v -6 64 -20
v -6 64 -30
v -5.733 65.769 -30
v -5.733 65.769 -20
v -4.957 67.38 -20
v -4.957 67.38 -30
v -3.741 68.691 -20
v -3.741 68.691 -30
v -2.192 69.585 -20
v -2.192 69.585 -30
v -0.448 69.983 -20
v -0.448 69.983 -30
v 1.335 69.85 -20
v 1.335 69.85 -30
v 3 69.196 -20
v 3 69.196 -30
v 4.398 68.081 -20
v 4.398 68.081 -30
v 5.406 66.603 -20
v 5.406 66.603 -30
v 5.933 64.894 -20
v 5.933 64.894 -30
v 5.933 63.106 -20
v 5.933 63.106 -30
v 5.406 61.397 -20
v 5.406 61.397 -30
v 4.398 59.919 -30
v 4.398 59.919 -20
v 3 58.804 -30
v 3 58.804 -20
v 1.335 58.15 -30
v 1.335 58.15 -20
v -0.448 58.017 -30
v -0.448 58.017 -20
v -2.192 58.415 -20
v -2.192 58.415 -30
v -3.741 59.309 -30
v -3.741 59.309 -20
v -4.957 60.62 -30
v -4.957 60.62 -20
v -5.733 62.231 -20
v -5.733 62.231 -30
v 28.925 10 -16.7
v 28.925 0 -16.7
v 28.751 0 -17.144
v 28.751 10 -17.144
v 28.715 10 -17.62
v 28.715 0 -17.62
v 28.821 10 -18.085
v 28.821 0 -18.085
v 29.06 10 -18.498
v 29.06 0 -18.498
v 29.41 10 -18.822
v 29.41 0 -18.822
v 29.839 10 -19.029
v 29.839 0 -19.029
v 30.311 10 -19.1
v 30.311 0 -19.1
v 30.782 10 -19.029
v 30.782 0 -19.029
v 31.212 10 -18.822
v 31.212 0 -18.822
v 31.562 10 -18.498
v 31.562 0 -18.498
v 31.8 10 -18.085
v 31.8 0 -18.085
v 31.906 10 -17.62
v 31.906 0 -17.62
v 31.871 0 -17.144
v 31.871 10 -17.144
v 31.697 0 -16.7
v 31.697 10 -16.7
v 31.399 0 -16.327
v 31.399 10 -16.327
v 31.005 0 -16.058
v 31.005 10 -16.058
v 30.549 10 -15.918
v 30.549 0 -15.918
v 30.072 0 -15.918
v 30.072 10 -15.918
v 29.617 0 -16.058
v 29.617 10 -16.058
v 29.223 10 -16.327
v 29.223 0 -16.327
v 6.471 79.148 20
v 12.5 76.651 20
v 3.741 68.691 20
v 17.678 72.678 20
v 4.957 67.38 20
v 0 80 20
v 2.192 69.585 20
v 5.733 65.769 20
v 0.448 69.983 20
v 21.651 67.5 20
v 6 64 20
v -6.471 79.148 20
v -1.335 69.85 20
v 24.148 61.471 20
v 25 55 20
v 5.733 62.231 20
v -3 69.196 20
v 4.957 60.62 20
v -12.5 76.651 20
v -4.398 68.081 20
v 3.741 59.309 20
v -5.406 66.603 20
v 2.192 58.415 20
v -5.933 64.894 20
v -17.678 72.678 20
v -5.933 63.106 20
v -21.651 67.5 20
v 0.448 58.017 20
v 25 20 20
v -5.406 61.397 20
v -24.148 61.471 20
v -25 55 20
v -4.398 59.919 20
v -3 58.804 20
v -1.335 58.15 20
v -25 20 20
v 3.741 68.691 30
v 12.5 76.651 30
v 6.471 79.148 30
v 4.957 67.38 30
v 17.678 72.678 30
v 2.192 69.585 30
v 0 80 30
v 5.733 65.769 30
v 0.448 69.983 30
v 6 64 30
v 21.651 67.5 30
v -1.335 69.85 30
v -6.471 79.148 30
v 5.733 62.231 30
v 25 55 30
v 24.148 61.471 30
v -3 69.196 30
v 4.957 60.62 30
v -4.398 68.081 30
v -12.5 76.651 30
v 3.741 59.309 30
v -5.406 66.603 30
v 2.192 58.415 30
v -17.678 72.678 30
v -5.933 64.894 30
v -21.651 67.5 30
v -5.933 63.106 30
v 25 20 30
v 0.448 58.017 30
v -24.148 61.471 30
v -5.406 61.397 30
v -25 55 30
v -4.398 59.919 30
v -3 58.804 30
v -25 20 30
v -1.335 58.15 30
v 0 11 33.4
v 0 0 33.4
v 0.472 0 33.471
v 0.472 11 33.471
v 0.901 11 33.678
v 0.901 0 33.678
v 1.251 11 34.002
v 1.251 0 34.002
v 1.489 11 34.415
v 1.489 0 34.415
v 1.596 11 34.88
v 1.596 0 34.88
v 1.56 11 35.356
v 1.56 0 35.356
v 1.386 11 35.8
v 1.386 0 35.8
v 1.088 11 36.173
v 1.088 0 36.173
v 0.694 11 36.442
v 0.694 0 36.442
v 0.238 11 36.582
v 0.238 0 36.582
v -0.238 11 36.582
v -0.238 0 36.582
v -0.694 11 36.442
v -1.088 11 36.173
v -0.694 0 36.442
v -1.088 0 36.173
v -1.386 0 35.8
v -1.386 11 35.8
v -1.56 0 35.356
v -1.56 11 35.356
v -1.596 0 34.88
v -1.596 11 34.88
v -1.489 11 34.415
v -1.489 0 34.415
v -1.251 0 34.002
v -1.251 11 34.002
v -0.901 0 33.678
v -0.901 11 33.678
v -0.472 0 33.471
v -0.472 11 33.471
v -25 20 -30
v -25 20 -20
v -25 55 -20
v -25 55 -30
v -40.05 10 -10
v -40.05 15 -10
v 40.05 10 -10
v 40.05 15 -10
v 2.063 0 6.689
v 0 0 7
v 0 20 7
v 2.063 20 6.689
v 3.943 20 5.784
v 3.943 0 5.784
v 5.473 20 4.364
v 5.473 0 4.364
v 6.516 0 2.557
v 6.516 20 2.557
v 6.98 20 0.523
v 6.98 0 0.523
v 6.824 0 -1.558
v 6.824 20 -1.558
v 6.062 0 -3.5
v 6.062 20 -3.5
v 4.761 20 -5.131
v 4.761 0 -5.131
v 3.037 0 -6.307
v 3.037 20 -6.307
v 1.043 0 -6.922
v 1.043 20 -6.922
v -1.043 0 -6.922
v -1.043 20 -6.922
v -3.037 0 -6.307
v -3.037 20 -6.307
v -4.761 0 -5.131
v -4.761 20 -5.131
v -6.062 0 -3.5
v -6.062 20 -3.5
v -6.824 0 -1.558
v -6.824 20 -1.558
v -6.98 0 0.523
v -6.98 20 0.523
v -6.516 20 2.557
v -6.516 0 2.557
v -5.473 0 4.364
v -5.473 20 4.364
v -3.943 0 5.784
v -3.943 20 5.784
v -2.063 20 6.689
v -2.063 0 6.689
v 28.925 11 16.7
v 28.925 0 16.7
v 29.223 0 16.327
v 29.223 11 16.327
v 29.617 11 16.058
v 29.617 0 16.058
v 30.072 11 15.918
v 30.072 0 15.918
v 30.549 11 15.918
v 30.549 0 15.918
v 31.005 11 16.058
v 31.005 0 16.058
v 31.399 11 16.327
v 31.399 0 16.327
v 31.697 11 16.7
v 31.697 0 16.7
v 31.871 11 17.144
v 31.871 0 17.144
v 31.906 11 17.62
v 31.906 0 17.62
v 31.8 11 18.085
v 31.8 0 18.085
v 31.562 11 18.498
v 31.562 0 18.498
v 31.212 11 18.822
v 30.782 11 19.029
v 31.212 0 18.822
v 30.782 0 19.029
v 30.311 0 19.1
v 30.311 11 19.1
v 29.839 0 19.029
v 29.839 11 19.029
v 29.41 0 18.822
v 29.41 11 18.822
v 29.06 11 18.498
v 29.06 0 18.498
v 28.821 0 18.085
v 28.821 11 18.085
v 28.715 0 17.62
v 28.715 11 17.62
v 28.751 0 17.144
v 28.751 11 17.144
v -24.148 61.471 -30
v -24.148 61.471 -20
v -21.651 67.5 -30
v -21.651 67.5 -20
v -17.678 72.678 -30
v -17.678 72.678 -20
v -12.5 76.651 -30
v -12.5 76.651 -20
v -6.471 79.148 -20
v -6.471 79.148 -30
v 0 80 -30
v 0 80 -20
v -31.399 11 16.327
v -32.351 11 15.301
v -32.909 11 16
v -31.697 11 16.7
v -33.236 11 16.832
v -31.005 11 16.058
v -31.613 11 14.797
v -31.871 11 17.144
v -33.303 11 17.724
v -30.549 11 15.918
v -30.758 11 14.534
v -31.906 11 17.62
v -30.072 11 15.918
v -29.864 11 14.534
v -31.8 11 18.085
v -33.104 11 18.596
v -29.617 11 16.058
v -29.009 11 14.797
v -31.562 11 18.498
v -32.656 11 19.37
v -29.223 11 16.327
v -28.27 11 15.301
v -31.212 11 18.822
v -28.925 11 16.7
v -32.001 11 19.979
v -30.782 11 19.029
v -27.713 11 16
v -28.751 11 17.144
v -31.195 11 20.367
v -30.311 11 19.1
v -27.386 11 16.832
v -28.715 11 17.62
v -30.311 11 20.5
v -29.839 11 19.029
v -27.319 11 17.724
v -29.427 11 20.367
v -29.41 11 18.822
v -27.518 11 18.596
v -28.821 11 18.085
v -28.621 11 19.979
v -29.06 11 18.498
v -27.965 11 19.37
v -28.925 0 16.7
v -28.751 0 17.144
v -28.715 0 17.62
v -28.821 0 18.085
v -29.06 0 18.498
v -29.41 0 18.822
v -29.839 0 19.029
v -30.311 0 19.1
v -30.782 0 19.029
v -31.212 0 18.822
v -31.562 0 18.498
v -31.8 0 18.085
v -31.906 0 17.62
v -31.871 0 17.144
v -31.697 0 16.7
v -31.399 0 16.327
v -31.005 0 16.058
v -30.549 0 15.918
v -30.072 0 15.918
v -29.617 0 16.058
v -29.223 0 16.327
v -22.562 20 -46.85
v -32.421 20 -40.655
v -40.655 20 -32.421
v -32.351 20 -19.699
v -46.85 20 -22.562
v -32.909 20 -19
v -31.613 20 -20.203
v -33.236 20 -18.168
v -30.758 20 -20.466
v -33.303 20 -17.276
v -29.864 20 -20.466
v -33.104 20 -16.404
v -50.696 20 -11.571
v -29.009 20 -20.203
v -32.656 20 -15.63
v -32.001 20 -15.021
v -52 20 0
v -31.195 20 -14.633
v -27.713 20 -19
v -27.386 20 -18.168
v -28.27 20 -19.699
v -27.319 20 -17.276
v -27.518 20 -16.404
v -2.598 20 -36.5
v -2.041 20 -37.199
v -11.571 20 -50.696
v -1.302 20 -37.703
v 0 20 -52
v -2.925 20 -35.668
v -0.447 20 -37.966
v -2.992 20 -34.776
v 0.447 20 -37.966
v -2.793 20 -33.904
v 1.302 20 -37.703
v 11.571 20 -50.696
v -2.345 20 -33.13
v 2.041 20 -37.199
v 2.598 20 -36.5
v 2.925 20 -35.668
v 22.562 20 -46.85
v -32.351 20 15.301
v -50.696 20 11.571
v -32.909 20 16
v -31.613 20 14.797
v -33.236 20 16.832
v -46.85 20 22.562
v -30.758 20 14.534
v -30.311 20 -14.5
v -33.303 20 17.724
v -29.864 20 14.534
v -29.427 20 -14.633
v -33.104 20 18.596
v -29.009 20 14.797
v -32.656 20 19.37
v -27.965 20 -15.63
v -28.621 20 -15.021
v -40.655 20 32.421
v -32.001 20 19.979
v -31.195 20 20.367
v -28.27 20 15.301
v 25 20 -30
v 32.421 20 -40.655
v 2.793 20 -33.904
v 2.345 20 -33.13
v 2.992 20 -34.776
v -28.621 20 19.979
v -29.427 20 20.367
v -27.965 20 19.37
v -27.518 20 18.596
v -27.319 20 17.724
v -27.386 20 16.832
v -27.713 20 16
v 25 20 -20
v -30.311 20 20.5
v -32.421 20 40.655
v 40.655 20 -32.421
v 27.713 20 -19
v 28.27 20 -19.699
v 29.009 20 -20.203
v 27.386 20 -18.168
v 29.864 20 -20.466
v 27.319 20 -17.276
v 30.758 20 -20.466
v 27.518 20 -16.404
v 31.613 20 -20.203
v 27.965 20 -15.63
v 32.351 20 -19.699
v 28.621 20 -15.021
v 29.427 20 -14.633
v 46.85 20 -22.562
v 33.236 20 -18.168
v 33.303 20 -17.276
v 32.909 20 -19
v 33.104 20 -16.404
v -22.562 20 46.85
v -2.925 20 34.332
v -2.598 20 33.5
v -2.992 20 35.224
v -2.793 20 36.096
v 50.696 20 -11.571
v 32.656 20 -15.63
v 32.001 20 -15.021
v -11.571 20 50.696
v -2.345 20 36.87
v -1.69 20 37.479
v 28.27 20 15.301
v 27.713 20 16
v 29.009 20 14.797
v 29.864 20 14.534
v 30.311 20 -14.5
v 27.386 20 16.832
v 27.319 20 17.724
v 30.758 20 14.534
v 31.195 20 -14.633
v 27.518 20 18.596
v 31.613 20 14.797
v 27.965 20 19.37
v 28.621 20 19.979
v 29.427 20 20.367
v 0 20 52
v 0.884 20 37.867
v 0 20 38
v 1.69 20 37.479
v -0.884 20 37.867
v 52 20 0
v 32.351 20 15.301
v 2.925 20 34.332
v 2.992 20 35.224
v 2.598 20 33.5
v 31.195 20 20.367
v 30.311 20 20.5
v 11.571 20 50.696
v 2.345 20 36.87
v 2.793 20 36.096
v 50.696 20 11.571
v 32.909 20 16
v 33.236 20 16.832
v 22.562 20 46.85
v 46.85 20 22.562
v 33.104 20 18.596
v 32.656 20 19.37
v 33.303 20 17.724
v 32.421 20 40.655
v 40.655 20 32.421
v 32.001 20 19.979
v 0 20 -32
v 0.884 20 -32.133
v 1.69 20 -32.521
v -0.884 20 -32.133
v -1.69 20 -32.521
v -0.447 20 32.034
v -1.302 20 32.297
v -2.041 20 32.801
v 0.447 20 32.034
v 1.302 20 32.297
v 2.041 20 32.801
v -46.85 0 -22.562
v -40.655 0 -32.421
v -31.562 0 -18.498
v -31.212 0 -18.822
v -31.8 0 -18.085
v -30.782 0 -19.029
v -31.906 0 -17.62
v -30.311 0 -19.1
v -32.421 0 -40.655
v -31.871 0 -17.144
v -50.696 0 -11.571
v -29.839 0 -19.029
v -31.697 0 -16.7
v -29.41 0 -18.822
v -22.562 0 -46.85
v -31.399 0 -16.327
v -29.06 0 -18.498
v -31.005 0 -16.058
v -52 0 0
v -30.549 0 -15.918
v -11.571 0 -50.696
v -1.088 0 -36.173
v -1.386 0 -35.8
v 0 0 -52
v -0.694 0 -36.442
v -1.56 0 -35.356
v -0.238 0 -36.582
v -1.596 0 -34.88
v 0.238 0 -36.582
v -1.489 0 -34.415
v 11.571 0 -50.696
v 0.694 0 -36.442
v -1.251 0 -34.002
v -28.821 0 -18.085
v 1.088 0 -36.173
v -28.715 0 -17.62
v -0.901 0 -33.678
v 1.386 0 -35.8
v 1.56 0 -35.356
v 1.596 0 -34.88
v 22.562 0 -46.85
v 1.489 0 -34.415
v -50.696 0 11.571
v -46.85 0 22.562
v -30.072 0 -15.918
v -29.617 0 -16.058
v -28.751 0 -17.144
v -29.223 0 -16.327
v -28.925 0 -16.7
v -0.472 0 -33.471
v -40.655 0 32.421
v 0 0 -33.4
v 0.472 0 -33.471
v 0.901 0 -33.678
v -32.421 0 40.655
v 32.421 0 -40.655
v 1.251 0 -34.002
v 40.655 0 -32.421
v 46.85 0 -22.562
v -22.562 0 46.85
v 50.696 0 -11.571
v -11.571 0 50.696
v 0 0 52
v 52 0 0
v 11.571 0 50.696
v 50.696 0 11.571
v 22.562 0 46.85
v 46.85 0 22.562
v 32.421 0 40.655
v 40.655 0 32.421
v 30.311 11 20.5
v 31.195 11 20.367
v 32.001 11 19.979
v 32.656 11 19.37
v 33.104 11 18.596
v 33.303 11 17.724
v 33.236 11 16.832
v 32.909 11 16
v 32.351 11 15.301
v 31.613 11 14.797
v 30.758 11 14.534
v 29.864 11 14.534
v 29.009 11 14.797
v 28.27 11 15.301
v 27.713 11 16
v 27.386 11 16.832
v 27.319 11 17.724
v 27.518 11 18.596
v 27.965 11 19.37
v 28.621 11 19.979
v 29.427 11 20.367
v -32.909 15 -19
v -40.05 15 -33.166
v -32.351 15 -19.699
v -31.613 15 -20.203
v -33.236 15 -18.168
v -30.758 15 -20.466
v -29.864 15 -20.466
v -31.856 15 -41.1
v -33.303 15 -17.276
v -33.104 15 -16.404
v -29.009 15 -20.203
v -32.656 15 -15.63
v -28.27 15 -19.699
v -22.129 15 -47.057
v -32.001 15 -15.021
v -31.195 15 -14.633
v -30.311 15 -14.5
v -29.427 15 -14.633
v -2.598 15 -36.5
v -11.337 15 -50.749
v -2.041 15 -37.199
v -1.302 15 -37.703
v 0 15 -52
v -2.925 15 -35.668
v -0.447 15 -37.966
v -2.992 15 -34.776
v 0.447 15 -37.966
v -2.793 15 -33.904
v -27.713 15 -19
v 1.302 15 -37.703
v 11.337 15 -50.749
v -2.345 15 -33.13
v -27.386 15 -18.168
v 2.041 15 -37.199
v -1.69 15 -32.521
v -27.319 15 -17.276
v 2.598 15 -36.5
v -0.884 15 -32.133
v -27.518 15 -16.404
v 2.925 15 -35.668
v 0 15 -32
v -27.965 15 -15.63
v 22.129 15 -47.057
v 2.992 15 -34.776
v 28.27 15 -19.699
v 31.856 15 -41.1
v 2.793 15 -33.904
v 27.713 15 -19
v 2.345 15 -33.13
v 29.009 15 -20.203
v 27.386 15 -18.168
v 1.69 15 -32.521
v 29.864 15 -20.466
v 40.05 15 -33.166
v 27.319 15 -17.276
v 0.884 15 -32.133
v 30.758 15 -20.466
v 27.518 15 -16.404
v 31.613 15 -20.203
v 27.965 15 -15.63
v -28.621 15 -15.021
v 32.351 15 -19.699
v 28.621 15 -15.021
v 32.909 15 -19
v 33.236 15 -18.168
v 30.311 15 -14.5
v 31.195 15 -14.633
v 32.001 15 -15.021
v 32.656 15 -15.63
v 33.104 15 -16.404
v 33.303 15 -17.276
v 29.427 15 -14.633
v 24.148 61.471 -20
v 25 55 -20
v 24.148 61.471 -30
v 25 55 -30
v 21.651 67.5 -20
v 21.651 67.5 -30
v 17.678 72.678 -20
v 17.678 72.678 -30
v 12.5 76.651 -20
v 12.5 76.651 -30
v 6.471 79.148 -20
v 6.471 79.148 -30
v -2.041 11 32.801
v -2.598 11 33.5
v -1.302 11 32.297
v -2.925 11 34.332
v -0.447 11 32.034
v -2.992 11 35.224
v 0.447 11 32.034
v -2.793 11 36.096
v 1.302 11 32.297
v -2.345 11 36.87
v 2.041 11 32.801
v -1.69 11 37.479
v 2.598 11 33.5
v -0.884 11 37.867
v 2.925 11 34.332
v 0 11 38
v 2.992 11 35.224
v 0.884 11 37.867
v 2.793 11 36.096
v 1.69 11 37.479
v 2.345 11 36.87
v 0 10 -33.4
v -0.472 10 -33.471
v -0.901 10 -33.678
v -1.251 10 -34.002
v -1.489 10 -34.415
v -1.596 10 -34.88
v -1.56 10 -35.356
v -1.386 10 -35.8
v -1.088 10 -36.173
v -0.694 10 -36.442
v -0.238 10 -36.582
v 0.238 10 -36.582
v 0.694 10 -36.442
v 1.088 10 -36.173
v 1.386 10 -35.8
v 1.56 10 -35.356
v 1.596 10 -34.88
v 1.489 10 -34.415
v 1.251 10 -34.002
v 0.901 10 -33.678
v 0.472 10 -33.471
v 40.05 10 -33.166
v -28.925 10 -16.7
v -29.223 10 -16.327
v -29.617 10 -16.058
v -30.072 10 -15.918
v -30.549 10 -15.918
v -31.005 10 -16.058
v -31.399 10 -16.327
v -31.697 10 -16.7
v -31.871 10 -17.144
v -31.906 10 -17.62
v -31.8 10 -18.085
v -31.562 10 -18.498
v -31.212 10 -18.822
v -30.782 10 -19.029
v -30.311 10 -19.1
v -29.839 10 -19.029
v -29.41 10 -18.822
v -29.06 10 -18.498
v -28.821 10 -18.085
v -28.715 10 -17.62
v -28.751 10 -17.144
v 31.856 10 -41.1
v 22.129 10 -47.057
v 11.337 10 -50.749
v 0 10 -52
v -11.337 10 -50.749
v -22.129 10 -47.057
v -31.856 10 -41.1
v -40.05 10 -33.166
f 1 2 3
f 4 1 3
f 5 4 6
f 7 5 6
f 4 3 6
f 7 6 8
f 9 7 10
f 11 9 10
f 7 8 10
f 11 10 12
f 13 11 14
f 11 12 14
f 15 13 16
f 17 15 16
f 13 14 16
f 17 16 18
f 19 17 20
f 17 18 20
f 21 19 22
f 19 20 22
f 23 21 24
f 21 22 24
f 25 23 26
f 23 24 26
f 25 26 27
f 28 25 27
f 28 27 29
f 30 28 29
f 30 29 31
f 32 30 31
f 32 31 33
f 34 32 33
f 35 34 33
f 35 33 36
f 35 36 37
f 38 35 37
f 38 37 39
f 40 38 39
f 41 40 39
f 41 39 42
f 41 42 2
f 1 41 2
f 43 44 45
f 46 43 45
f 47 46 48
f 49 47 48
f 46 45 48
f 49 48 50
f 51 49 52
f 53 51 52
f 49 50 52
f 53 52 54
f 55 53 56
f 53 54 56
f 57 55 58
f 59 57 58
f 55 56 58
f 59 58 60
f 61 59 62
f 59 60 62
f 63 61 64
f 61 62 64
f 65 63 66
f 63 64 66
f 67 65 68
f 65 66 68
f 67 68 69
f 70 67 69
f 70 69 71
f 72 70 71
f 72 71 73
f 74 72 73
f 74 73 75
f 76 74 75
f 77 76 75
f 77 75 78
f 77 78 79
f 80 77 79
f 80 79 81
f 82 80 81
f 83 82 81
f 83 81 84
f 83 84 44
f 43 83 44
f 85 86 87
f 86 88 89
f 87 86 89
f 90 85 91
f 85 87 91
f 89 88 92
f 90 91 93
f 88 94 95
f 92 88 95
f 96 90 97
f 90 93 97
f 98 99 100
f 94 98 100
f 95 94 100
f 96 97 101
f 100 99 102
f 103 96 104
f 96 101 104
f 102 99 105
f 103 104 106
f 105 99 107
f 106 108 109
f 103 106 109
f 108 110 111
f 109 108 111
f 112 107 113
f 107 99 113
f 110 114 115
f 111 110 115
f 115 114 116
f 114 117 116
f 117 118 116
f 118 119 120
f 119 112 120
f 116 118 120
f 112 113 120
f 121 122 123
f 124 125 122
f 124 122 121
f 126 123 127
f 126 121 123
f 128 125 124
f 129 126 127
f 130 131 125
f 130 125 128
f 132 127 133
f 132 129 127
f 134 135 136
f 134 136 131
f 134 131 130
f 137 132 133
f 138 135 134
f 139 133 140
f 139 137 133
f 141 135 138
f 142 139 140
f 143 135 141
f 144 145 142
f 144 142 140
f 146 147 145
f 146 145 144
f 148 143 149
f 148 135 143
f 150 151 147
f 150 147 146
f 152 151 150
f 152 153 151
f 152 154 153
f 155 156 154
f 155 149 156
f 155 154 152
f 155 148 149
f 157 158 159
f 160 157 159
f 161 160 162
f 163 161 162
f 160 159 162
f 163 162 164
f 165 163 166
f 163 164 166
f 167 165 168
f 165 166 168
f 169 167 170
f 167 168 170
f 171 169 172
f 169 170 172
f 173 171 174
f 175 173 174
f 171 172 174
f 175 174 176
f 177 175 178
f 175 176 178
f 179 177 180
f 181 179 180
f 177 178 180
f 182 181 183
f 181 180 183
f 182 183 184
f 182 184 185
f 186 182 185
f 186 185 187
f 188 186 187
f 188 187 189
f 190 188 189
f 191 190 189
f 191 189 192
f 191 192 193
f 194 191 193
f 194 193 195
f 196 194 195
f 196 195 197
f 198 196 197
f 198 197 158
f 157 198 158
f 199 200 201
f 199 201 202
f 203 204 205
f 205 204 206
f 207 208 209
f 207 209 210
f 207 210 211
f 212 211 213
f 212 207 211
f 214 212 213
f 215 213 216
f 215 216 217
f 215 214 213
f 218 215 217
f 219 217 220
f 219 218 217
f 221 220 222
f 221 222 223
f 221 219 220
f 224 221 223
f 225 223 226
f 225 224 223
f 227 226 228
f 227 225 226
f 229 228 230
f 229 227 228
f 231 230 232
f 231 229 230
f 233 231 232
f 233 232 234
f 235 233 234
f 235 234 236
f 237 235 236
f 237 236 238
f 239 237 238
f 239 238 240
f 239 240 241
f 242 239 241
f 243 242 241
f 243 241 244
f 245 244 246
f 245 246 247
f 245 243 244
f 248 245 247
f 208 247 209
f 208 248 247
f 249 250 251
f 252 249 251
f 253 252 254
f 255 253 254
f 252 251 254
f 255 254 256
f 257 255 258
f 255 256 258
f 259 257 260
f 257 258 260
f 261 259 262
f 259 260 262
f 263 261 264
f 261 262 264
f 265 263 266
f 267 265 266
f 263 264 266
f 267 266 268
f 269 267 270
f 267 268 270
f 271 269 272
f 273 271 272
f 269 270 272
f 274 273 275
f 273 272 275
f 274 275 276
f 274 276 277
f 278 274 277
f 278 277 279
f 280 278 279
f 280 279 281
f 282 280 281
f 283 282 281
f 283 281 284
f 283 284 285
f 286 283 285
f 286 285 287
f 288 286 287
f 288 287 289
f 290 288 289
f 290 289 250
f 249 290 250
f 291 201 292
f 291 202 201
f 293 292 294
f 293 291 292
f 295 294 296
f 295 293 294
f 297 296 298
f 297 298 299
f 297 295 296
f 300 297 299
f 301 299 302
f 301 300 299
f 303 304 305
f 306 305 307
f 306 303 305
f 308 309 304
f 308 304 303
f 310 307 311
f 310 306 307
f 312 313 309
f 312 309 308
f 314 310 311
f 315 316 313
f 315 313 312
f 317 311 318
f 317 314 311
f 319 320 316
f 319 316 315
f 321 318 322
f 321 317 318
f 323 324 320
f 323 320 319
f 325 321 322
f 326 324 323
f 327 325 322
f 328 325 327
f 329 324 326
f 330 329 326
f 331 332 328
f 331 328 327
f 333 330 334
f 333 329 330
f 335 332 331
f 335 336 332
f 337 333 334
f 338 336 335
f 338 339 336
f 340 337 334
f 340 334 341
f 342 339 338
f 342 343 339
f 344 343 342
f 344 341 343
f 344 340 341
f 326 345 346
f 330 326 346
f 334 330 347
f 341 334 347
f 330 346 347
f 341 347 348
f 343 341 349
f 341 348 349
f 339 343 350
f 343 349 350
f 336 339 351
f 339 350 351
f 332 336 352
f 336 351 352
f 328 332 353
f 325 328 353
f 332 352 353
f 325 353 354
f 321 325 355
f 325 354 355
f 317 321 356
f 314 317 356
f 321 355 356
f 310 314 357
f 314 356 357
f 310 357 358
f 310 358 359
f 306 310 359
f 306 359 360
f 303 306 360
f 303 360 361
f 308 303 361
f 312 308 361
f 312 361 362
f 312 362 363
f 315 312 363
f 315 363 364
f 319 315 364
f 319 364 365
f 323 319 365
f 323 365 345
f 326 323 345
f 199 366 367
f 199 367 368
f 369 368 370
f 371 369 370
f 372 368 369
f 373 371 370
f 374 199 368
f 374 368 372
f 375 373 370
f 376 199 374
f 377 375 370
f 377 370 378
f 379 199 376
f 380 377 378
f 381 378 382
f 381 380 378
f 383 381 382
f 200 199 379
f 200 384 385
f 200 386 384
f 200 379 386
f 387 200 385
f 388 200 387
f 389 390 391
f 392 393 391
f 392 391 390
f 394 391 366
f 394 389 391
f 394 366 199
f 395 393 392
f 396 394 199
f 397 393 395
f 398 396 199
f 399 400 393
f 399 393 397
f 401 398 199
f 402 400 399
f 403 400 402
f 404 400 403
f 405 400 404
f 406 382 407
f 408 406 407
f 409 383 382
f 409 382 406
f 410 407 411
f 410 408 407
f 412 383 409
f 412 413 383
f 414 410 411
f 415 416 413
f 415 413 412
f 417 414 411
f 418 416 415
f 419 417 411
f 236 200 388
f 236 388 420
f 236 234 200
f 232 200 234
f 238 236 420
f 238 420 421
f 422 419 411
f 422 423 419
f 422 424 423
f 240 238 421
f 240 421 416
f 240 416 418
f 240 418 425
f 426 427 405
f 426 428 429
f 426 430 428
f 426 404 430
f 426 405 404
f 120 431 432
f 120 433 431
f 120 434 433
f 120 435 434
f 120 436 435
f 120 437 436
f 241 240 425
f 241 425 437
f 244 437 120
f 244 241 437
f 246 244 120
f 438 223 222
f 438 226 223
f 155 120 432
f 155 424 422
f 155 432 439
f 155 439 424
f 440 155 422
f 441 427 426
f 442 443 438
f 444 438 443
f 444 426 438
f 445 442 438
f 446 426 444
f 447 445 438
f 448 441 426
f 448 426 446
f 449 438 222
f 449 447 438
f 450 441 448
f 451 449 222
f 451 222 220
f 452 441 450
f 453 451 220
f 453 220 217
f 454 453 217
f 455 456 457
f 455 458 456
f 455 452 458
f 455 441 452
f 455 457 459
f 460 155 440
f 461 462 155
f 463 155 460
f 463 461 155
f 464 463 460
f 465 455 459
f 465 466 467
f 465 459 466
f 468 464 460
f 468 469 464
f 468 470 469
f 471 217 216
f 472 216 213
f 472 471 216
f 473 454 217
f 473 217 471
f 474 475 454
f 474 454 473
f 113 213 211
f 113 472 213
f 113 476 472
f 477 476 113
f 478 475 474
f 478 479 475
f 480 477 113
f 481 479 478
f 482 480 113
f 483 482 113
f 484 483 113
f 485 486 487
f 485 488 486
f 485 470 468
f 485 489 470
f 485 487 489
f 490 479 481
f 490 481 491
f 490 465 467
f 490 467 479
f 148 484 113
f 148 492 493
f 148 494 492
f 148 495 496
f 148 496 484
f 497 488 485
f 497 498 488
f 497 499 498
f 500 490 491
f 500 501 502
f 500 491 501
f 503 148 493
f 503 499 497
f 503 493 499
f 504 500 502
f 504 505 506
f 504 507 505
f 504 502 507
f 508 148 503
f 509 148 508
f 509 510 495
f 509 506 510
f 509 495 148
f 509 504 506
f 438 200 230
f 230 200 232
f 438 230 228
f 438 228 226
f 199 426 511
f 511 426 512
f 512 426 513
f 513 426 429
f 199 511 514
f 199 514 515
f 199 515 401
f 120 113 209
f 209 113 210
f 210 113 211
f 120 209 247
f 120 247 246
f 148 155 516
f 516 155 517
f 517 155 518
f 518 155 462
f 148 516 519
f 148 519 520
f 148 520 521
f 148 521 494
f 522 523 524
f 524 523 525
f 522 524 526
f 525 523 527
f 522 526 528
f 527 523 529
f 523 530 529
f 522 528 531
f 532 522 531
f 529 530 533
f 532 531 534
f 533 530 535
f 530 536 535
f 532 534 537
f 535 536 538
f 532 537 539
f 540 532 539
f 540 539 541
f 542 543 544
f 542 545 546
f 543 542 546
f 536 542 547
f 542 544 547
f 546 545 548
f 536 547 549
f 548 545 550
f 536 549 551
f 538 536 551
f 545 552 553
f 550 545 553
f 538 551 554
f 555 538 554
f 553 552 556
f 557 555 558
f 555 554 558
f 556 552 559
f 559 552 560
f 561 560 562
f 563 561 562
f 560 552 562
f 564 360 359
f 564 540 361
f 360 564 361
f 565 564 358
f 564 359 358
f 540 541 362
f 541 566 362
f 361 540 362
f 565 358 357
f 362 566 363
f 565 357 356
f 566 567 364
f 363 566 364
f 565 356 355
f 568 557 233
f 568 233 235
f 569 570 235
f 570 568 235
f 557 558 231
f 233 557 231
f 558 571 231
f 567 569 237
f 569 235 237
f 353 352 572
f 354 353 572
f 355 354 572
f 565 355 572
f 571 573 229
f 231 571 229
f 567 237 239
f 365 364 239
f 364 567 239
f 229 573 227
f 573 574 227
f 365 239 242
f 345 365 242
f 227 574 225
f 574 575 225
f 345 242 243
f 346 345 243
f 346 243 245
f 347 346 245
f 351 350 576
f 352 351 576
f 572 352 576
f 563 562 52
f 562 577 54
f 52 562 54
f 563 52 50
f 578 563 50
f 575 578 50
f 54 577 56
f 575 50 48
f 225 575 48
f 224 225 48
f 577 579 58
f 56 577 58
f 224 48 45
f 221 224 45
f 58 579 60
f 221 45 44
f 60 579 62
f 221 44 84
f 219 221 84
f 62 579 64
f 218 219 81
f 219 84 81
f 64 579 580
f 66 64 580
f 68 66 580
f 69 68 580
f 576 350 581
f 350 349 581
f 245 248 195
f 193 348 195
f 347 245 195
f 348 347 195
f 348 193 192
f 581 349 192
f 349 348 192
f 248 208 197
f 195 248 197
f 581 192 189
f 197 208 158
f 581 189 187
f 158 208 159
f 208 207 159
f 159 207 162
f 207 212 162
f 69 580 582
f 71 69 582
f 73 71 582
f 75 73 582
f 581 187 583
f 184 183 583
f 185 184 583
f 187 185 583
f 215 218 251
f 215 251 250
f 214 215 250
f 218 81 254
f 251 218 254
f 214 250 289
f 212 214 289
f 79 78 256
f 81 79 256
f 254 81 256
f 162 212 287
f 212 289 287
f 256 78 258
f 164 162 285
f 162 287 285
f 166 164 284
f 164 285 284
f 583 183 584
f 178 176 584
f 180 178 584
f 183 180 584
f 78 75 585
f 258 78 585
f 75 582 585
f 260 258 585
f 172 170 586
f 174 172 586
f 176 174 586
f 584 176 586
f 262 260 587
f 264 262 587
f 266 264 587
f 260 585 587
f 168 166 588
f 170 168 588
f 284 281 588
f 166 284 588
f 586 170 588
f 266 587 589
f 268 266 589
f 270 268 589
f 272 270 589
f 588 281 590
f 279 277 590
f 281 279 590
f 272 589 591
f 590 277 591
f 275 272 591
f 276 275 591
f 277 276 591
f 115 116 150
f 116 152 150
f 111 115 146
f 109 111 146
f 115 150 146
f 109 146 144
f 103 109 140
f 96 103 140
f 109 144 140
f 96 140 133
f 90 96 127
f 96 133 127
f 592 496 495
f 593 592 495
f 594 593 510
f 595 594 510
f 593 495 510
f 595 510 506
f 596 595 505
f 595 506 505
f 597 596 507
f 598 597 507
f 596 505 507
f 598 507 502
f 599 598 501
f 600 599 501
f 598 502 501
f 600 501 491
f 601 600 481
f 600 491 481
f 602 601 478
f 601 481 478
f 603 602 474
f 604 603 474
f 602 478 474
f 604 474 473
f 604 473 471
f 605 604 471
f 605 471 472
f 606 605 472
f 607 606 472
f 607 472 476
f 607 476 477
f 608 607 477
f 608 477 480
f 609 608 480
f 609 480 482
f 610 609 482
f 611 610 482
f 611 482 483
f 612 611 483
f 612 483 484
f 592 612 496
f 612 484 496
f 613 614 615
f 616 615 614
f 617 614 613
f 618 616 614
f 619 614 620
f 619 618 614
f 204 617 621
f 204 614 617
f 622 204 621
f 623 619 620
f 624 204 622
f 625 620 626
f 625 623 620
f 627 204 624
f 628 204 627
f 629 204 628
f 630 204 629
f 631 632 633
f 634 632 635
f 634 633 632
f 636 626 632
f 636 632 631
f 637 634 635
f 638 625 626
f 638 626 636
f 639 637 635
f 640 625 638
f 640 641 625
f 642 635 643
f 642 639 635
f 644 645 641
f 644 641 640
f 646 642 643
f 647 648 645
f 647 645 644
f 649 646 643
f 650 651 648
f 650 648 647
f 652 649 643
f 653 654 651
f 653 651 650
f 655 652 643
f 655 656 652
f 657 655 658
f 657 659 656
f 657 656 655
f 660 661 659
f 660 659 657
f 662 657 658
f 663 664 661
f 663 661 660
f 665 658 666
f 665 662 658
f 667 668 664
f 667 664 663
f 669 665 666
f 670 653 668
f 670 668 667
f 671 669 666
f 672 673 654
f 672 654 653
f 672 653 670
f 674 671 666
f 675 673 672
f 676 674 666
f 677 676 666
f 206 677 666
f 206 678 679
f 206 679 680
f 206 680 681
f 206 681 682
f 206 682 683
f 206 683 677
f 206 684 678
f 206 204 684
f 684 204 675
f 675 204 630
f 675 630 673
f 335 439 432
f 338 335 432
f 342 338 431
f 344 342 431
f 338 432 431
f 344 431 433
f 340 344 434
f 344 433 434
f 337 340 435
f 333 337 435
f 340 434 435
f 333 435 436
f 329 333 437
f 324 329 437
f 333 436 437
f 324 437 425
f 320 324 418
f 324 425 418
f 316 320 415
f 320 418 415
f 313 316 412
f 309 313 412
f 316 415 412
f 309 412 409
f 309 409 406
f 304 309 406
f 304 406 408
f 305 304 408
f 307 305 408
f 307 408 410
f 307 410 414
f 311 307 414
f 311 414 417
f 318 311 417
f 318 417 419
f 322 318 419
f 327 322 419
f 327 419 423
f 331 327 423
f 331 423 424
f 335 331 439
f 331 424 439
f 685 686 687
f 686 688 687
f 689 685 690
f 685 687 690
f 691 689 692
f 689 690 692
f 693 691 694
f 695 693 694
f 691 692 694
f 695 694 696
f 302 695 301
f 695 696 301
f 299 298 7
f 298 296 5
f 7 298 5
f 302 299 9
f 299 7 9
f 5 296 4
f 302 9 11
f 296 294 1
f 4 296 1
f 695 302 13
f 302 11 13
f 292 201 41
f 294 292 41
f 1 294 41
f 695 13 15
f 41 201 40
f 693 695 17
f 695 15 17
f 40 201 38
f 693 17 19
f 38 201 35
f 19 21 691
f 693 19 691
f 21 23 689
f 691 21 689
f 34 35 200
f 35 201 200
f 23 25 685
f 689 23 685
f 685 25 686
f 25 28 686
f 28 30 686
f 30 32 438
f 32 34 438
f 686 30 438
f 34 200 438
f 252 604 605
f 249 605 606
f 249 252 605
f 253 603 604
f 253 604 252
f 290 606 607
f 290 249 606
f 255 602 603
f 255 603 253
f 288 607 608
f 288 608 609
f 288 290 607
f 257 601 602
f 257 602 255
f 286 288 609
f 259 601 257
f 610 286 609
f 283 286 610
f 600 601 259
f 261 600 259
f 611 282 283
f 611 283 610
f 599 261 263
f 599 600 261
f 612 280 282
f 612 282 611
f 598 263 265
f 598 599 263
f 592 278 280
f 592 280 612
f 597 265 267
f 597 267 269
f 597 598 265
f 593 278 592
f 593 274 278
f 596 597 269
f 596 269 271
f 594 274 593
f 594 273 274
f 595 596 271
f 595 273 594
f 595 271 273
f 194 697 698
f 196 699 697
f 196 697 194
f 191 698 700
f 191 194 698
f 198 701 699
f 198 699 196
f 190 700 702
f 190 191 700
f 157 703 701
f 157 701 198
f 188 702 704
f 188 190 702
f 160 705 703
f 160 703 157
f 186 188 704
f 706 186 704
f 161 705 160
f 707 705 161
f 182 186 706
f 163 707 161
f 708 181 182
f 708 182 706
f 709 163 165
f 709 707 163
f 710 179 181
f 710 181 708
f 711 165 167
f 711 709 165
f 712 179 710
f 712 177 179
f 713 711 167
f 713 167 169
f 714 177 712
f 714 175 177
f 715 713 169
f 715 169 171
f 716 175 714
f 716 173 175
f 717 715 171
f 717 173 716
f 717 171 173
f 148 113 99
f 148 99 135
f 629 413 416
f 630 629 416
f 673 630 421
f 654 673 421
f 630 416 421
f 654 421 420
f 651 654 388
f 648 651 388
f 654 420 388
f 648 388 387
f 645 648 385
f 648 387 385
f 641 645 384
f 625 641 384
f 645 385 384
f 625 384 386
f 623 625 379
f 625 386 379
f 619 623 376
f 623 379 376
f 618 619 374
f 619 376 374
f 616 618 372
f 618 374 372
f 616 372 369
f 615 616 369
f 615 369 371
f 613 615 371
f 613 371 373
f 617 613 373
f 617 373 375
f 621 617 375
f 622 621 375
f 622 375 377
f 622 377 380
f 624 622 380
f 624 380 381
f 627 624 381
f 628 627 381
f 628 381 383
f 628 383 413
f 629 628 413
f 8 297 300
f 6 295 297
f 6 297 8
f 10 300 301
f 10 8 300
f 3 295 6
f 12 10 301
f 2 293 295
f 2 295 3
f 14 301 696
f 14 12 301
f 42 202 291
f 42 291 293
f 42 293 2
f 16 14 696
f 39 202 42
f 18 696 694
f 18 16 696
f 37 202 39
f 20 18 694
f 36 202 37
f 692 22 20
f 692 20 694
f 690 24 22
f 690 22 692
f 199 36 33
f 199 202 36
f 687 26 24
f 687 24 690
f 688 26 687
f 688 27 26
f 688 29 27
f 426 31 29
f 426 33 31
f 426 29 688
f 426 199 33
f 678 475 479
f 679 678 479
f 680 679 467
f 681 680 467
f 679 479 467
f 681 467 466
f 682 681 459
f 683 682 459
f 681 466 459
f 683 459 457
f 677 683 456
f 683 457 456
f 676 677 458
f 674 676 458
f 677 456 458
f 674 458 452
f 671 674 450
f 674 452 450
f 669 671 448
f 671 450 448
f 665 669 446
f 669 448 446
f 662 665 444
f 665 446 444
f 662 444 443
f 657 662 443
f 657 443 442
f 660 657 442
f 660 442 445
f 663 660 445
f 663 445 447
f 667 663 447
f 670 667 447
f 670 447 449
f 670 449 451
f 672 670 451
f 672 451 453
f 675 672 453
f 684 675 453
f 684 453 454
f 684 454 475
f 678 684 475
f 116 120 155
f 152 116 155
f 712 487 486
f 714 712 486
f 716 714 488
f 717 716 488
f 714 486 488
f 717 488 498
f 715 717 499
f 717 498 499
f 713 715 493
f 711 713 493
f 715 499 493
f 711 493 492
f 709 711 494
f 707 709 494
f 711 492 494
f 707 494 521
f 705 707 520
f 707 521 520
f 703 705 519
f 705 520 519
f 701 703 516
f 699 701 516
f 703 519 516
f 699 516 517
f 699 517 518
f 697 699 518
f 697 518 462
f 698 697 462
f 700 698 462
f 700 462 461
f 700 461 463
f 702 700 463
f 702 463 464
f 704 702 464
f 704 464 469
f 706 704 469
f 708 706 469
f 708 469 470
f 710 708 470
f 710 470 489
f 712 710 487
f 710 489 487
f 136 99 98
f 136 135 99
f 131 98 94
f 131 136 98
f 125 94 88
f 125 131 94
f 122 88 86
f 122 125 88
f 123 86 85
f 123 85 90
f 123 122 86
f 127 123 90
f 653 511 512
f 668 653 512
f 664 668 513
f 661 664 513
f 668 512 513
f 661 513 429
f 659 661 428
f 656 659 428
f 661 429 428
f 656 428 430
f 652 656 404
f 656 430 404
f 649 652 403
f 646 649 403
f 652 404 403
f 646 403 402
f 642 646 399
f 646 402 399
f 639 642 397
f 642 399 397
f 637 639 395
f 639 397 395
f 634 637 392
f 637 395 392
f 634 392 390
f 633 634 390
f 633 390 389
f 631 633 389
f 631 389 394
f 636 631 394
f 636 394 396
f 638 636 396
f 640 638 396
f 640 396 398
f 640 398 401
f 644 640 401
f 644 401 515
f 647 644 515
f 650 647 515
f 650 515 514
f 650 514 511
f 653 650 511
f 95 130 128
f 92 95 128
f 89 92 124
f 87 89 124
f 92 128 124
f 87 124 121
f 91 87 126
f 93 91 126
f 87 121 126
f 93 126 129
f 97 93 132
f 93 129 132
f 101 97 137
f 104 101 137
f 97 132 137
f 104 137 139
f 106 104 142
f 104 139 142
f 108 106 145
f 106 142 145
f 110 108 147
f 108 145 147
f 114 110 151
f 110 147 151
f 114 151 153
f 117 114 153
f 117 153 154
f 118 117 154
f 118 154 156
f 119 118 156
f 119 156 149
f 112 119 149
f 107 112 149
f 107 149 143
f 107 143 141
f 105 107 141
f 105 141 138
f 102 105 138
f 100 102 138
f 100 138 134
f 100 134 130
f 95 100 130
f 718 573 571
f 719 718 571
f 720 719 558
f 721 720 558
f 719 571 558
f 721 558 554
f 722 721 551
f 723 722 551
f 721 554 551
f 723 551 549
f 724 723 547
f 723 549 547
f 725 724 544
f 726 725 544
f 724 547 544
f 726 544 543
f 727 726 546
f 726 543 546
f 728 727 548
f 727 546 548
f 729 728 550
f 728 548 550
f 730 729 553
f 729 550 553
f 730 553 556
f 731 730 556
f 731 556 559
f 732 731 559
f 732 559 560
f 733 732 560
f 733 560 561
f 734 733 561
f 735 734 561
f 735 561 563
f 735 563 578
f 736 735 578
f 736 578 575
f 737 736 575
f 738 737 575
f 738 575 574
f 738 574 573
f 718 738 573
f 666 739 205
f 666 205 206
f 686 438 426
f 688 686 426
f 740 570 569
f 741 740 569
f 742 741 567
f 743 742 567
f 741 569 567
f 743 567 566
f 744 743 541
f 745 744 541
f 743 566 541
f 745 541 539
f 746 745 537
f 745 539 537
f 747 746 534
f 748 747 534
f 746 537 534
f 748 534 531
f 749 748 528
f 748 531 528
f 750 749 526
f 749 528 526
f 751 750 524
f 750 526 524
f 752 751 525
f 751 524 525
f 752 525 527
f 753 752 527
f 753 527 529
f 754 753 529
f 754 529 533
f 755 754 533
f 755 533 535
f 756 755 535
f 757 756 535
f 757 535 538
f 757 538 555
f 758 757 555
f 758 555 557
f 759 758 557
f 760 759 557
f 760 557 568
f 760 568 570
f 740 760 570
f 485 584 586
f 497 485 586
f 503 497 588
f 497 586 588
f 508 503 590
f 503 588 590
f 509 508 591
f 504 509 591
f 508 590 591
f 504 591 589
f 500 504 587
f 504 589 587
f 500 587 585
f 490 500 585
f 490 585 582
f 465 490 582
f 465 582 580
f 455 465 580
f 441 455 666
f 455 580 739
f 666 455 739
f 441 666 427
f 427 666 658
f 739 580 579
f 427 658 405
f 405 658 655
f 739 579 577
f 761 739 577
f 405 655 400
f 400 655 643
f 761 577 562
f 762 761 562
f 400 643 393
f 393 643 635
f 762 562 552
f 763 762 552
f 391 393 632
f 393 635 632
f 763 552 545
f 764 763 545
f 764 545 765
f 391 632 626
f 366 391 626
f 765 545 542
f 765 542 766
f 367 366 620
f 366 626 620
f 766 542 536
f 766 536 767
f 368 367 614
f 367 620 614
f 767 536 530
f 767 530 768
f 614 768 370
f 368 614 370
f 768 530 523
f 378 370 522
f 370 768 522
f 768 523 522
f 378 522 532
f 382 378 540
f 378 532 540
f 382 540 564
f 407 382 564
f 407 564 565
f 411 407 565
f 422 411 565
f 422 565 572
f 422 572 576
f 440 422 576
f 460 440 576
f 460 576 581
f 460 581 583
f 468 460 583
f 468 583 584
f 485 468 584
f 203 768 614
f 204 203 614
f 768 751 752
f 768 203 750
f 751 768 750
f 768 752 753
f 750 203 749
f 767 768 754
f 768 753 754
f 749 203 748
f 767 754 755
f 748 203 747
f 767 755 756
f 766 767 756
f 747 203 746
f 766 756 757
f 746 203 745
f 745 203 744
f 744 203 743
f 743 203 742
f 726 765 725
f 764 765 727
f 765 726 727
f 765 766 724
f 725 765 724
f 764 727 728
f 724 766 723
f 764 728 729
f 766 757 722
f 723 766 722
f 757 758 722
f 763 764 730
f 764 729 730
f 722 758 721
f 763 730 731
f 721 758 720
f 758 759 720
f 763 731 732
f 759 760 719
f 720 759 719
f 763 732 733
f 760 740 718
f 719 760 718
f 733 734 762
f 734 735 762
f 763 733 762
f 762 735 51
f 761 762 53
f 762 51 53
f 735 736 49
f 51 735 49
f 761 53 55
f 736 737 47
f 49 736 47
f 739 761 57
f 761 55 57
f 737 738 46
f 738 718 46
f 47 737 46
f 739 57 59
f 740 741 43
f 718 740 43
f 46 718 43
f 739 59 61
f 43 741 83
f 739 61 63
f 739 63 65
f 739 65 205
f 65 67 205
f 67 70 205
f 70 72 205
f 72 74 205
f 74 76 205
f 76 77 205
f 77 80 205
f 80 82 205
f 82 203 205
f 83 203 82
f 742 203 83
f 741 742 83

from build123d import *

# Parameters (mm, degrees)
ESQUISSE1_R                        = 52
ESQUISSE1_R_2                      = 7
BOSS_EXTRU_1_DEPTH                 = 20
ESQUISSE2_W                        = 50
ESQUISSE2_H                        = 10
BOSS_EXTRU_2_DEPTH                 = 60
CONG_1_R                           = 25
ESQUISSE3_R                        = 6
ENL_V_MAT_EXTRU_1_DEPTH            = 40
R_P_TITION_CIRCULAIRE1_COUNT       = 2
CONG_1_OF_R_P_TITION_CIRCULAIRE1_R = 25
ESQUISSE5_R                        = 1.6
ENL_V_MAT_EXTRU_2_DEPTH            = 20
R_P_TITION_CIRCULAIRE2_COUNT       = 6
ESQUISSE6_R                        = 3
ENL_V_MAT_EXTRU_3_DEPTH            = 9
ENL_V_START                        = -10
ESQUISSE7_W                        = 80.1
ESQUISSE7_H                        = 5
ENL_V_MAT_EXTRU_4_DEPTH            = 45


with BuildPart() as part:
    # Esquisse1 → Boss.-Extru.1 (new body)
    with BuildSketch(Plane(origin=(0, 0, 0), x_dir=(1, 0, 0), z_dir=(0, 1, 0))):
        with Locations(Location((0, 0, 0), (0, 0, 270))):
            Circle(ESQUISSE1_R)
        with Locations(Location((0, 0, 0), (0, 0, 270))):
            Circle(ESQUISSE1_R_2, mode=Mode.SUBTRACT)
    extrude(amount=BOSS_EXTRU_1_DEPTH)

    # Esquisse2 → Boss.-Extru.2 (add)
    with BuildSketch(Plane(origin=(0, 20, 0), x_dir=(1, 0, 0), z_dir=(0, 1, 0))):
        with Locations((0, 25)):
            Rectangle(ESQUISSE2_W, ESQUISSE2_H)
    boss_extru_2 = extrude(amount=BOSS_EXTRU_2_DEPTH)

    # Congé1
    cong_1_edges = [part.edges().sort_by_distance(p)[0] for p in [
        (25, 80, -25),
        (-25, 80, -25),
    ]]
    fillet(cong_1_edges, radius=CONG_1_R - 0.0001)  # a hair under: the kernel refuses the full size

    # Esquisse3 → Enlèv. mat.-Extru.1 (cut)
    with BuildSketch(Plane(origin=(0, 0, -30), x_dir=(-1, 0, 0), z_dir=(0, 0, -1))):
        with Locations((0, 64)):
            Circle(ESQUISSE3_R)
    enl_v_mat_extru_1 = extrude(amount=-ENL_V_MAT_EXTRU_1_DEPTH, mode=Mode.SUBTRACT)

    # Répétition circulaire1: Boss.-Extru.2, Enlèv. mat.-Extru.1 ×2 about axis
    r_p_tition_circulaire1_axis = Axis((0, 0, 0), (0, 1, 0))
    add([boss_extru_2.rotate(r_p_tition_circulaire1_axis, i * 360 / R_P_TITION_CIRCULAIRE1_COUNT) for i in range(1, R_P_TITION_CIRCULAIRE1_COUNT)])
    add([enl_v_mat_extru_1.rotate(r_p_tition_circulaire1_axis, i * 360 / R_P_TITION_CIRCULAIRE1_COUNT) for i in range(1, R_P_TITION_CIRCULAIRE1_COUNT)], mode=Mode.SUBTRACT)

    # Congé1 of Répétition circulaire1
    cong_1_of_r_p_tition_circulaire1_edges = [part.edges().sort_by_distance(p)[0] for p in [
        (-25, 80, 25),
        (25, 80, 25),
    ]]
    fillet(cong_1_of_r_p_tition_circulaire1_edges, radius=CONG_1_OF_R_P_TITION_CIRCULAIRE1_R - 0.0001)  # a hair under: the kernel refuses the full size

    # Esquisse5 → Enlèv. mat.-Extru.2 (cut)
    with BuildSketch(Plane.XZ):
        with Locations(Location((0, 35, 0), (0, 0, 270))):
            Circle(ESQUISSE5_R)
    enl_v_mat_extru_2 = extrude(amount=-ENL_V_MAT_EXTRU_2_DEPTH, mode=Mode.SUBTRACT)

    # Répétition circulaire2: Enlèv. mat.-Extru.2 ×6 about axis
    r_p_tition_circulaire2_axis = Axis((0, 0, 0), (0, 1, 0))
    for i in range(1, R_P_TITION_CIRCULAIRE2_COUNT):
        add(enl_v_mat_extru_2.rotate(r_p_tition_circulaire2_axis, i * 360 / R_P_TITION_CIRCULAIRE2_COUNT), mode=Mode.SUBTRACT)

    # Esquisse6 → Enlèv. mat.-Extru.3 (cut)
    with BuildSketch(Plane(origin=(0, 20, 0), x_dir=(1, 0, 0), z_dir=(0, 1, 0))):
        with Locations(Location((30.310889132, 17.5, 0), (0, 0, 270))):
            Circle(ESQUISSE6_R)
        with Locations(Location((30.310889132, -17.5, 0), (0, 0, 270))):
            Circle(ESQUISSE6_R)
        with Locations(Location((0, -35, 0), (0, 0, 270))):
            Circle(ESQUISSE6_R)
        with Locations(Location((-30.310889132, -17.5, 0), (0, 0, 270))):
            Circle(ESQUISSE6_R)
        with Locations(Location((-30.310889132, 17.5, 0), (0, 0, 270))):
            Circle(ESQUISSE6_R)
        with Locations(Location((0, 35, 0), (0, 0, 270))):
            Circle(ESQUISSE6_R)
    extrude(amount=-ENL_V_MAT_EXTRU_3_DEPTH, mode=Mode.SUBTRACT)

    # Esquisse7 → Enlèv. mat.-Extru.4 (cut)
    with BuildSketch(Plane.XY.offset(ENL_V_START)):
        with Locations((0, 12.5)):
            Rectangle(ESQUISSE7_W, ESQUISSE7_H)
    extrude(amount=-ENL_V_MAT_EXTRU_4_DEPTH, mode=Mode.SUBTRACT)


solid = part.part
